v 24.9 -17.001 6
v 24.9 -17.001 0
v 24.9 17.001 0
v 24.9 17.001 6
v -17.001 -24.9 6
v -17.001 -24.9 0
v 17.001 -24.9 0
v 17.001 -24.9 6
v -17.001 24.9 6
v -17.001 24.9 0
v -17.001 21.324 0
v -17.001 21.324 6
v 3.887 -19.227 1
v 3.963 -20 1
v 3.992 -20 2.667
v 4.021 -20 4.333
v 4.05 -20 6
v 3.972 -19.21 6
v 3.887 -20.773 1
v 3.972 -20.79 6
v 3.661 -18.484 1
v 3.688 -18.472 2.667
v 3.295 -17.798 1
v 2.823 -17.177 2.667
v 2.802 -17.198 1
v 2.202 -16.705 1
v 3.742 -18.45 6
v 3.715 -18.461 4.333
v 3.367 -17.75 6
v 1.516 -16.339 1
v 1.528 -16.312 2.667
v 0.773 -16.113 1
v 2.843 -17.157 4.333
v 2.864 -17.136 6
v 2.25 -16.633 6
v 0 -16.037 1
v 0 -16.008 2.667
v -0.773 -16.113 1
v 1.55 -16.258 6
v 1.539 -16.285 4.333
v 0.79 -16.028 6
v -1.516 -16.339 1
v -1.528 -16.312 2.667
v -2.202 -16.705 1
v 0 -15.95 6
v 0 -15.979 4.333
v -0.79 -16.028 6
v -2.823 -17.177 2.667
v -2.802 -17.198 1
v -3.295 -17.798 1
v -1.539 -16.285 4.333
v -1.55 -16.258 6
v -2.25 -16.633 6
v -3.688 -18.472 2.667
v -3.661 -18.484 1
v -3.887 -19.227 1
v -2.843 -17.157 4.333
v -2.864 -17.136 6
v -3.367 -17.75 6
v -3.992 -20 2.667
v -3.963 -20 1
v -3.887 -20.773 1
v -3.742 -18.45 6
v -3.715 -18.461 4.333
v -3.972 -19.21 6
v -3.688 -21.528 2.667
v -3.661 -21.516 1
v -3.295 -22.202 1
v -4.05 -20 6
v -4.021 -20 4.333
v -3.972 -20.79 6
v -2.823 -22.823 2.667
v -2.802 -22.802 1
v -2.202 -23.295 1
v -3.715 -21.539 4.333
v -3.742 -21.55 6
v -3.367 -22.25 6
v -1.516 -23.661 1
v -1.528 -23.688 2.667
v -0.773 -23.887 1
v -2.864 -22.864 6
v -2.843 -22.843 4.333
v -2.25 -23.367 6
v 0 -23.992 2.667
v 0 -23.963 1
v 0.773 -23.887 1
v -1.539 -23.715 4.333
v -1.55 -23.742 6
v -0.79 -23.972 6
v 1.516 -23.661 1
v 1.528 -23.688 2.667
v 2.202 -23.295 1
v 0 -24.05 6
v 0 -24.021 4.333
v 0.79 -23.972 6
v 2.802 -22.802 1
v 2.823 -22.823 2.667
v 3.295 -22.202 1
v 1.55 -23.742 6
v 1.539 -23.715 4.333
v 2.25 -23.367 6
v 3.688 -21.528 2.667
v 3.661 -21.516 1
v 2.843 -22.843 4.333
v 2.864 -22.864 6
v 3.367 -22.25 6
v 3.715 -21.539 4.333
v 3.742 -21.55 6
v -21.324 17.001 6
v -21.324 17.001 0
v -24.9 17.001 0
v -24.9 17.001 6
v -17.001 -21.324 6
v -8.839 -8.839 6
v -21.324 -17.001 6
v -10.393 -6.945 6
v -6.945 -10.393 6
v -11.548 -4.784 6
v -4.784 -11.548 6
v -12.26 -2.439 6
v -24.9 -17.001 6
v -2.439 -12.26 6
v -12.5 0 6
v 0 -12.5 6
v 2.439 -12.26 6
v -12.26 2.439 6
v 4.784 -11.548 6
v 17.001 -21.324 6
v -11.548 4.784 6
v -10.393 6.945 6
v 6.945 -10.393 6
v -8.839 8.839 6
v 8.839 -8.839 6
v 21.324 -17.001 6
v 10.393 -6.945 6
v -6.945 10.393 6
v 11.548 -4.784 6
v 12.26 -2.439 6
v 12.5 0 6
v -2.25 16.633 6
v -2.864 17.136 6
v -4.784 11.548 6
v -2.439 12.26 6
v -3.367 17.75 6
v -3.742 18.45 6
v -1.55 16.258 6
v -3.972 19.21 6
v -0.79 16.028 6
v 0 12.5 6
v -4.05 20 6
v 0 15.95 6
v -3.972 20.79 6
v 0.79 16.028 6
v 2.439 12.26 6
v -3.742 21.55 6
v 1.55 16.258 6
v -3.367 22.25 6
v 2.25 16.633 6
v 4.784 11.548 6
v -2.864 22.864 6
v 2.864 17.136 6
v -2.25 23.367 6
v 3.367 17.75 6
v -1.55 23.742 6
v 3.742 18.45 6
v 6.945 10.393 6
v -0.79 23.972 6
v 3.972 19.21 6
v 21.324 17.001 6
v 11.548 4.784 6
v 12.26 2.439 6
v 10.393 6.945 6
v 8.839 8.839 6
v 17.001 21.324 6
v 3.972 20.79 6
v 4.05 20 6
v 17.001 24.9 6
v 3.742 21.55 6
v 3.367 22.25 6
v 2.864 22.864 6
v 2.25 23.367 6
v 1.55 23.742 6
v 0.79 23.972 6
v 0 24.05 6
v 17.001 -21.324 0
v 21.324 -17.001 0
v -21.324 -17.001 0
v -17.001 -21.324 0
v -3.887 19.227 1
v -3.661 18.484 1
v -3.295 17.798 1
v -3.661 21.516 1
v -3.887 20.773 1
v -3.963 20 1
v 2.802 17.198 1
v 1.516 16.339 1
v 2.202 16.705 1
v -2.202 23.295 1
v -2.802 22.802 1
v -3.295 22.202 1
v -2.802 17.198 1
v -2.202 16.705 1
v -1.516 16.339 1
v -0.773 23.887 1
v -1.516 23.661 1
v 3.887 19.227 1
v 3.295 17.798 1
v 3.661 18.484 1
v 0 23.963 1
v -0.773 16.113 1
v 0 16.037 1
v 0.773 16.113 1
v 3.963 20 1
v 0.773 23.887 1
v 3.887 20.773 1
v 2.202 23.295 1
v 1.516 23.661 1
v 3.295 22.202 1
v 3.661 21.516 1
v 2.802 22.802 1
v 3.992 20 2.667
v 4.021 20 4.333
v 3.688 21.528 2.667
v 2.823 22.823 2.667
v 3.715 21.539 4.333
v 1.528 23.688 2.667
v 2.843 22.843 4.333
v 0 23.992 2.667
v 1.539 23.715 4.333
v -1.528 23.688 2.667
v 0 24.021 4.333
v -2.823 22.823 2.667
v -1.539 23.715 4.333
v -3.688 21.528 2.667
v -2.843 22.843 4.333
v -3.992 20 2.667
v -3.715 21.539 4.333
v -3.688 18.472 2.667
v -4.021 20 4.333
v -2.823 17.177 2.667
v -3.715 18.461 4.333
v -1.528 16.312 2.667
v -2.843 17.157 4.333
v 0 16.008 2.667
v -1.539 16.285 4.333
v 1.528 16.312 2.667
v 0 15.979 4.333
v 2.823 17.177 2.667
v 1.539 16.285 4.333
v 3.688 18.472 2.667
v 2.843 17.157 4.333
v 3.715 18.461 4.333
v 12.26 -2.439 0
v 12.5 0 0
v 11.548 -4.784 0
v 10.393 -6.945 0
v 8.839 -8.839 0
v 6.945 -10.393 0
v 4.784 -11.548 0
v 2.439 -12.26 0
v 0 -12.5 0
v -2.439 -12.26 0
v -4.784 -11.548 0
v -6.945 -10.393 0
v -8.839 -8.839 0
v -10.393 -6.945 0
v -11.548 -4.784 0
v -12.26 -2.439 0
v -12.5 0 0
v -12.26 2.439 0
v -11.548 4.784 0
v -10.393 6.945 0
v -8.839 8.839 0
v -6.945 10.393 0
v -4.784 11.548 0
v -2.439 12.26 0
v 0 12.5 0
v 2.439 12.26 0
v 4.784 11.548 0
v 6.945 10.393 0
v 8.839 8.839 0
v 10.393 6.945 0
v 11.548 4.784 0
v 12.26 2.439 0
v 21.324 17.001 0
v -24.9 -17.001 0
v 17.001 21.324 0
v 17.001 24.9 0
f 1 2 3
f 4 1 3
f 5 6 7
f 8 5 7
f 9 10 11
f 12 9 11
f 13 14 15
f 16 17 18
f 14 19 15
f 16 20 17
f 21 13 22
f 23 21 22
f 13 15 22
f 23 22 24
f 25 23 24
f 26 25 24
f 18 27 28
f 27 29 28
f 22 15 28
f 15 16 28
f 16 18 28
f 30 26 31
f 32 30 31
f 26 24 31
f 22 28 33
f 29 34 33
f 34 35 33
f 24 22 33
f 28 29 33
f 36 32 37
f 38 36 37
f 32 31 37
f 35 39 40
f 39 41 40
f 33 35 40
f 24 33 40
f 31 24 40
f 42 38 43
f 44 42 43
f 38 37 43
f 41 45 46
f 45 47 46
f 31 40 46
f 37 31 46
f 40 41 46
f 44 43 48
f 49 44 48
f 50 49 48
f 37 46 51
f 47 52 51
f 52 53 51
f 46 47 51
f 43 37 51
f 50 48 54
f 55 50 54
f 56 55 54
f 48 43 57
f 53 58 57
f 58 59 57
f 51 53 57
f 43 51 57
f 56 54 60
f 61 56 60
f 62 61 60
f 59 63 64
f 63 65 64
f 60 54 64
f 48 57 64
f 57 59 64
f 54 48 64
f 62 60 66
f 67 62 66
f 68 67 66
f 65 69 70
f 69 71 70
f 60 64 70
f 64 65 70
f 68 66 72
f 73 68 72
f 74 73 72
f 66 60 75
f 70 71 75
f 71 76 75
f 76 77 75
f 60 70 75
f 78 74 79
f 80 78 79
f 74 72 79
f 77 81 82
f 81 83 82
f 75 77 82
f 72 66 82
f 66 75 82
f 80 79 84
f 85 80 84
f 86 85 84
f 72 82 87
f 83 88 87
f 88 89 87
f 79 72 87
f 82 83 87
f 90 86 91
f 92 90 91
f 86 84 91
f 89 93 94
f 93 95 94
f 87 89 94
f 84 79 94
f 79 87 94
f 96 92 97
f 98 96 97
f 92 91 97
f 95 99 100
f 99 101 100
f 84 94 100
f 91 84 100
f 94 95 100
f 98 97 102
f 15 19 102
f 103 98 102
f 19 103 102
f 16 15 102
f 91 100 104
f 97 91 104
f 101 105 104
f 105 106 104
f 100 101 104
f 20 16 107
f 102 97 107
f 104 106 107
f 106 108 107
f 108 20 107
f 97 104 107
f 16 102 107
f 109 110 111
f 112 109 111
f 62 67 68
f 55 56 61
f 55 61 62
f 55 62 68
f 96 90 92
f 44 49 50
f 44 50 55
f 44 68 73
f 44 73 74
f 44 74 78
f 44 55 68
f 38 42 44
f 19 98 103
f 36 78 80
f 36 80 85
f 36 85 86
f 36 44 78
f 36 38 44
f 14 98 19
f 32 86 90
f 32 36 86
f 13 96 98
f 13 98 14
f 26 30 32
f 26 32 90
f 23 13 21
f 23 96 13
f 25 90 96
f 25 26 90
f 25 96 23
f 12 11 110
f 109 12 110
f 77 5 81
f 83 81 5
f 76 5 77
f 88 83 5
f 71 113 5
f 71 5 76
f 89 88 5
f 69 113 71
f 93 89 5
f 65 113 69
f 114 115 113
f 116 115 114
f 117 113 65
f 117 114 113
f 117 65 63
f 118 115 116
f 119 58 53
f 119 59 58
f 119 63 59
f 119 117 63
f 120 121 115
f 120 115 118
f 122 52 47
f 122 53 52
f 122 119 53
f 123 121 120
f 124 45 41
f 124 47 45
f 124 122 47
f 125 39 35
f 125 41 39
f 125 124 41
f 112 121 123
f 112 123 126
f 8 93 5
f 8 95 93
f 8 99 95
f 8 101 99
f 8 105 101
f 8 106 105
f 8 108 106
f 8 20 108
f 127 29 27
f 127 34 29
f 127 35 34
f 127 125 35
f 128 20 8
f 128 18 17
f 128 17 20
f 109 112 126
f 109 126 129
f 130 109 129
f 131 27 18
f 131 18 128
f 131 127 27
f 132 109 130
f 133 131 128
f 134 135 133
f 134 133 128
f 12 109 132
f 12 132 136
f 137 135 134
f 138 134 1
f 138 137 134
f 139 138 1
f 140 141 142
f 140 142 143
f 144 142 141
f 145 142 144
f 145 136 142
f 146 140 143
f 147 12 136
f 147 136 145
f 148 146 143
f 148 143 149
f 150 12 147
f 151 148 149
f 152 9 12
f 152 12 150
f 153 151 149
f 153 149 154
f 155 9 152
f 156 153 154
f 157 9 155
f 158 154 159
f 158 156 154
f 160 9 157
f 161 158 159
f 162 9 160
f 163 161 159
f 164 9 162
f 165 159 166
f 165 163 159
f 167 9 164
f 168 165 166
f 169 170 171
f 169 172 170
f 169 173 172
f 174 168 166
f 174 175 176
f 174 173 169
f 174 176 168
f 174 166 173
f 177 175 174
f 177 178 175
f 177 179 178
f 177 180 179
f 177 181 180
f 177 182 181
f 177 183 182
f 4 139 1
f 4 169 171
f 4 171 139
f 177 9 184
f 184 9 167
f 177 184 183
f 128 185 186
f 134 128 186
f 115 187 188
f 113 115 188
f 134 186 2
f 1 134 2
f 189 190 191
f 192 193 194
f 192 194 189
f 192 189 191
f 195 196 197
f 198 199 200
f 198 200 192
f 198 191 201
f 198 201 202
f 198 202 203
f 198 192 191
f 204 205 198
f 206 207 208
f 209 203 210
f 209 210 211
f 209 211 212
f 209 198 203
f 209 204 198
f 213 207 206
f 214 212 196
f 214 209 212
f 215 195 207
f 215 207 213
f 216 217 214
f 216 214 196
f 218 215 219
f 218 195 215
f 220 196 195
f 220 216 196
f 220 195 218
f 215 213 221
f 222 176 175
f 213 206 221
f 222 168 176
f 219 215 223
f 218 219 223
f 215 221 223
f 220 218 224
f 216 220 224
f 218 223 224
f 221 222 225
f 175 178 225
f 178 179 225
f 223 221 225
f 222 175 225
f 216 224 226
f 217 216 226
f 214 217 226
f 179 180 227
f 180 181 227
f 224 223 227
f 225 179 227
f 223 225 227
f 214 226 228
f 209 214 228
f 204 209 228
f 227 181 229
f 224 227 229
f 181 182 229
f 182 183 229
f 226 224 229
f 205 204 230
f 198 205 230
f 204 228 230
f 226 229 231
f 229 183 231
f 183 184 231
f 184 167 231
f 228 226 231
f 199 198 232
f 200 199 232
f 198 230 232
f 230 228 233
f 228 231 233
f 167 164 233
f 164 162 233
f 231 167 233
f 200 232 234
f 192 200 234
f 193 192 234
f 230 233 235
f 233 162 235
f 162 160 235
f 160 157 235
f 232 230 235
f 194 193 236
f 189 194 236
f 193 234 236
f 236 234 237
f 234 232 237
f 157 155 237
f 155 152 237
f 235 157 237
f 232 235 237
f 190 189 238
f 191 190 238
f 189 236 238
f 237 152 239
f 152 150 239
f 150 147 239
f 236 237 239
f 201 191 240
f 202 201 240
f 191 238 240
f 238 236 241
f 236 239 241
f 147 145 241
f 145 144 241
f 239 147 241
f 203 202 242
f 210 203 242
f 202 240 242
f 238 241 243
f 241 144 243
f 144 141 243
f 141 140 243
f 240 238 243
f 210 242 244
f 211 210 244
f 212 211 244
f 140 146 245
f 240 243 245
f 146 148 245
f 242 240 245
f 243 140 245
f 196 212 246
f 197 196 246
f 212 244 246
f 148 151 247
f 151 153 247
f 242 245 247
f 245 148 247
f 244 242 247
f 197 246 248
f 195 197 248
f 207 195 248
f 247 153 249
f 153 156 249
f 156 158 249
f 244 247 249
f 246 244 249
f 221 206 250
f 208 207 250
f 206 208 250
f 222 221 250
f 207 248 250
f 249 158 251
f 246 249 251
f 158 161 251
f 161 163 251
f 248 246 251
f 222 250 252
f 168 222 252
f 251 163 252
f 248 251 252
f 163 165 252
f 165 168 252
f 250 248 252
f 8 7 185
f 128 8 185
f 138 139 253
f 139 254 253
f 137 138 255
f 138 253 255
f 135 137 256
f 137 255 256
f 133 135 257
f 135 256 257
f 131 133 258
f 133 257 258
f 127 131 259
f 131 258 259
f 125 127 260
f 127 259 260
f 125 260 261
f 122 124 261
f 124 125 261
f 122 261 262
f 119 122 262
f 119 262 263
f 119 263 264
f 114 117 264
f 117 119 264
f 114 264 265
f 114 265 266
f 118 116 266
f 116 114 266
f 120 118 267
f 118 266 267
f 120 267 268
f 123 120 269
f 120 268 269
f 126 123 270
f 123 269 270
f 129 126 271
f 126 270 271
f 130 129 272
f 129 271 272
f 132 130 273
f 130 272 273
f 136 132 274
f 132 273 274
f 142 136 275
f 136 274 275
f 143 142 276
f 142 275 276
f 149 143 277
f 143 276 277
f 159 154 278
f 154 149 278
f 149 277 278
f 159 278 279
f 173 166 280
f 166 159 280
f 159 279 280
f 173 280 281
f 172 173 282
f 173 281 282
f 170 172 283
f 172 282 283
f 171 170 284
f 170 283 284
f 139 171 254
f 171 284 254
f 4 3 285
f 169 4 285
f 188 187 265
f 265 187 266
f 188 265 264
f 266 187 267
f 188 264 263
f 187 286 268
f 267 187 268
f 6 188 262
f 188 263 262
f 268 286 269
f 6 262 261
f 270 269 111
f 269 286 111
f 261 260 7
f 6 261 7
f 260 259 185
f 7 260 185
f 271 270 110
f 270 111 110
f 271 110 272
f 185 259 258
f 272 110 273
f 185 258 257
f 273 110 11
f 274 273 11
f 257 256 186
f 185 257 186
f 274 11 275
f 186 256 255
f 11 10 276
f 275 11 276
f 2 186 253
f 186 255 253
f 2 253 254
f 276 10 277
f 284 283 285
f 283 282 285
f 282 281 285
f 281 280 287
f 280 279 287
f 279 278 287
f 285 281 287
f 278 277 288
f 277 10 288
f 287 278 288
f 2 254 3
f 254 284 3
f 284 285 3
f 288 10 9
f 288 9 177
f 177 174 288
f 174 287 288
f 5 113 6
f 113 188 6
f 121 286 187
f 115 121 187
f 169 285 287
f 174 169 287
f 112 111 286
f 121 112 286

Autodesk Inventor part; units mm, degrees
ref_plane "YZ Plane" through (0, 0, 0) normal (1, 0, 0) x (0, 1, 0)
ref_plane "XZ Plane" through (0, 0, 0) normal (0, 1, 0) x (-1, 0, 0)
ref_plane "XY Plane" through (0, 0, 0) normal (0, 0, 1) x (1, 0, 0)
sketch "Sketch1" plane through (0, 0, 0) normal (0, 0, 1) x (1, 0, 0)
  line L0 (-34.86, 0) -> (34.86, 0) construction
  line L1 (0, -34.86) -> (0, 34.86) construction
  line L2 (0, 0) -> (11.157509, 11.157509) construction
  line L3 (0, 0) -> (15.7791, 0) construction
  line L4 (0, 24.9) -> (16.800857, 24.9)
  line L5 (16.800857, 24.9) -> (16.800857, 21.241488)
  line L6 (16.800857, 21.241488) -> (19.021172, 19.021172)
  line L7 (24.9, 0) -> (24.9, 16.800857)
  line L8 (24.9, 16.800857) -> (21.241488, 16.800857)
  line L9 (21.241488, 16.800857) -> (19.021172, 19.021172)
  line L10 (0, -24.9) -> (16.800857, -24.9)
  line L11 (16.800857, -24.9) -> (16.800857, -21.241488)
  line L12 (16.800857, -21.241488) -> (19.021172, -19.021172)
  line L13 (24.9, 0) -> (24.9, -16.800857)
  line L14 (24.9, -16.800857) -> (21.241488, -16.800857)
  line L15 (21.241488, -16.800857) -> (19.021172, -19.021172)
  line L16 (0, 24.9) -> (-16.800857, 24.9)
  line L17 (-16.800857, 24.9) -> (-16.800857, 21.241488)
  line L18 (-16.800857, 21.241488) -> (-19.021172, 19.021172)
  line L19 (-24.9, 16.800857) -> (-21.241488, 16.800857)
  line L20 (-21.241488, 16.800857) -> (-19.021172, 19.021172)
  line L21 (0, -24.9) -> (-16.800857, -24.9)
  line L22 (-16.800857, -24.9) -> (-16.800857, -21.241488)
  line L23 (-16.800857, -21.241488) -> (-19.021172, -19.021172)
  line L24 (-21.241488, -16.800857) -> (-19.021172, -19.021172)
  line L25 (-24.9, -16.800857) -> (-21.241488, -16.800857)
  line L26 (-24.9, 0) -> (-24.9, -16.800857)
  line L27 (-24.9, 0) -> (-24.9, 16.800857)
  circle A0 centre (0, 0) radius 12.5
  dimension "d0" = 45
  dimension "d2" = 24.9
  dimension "d3" = 3.14
  dimension "d4" = 26.9
  dimension "d5" = 25
extrude "Extrusion1" add sketch "Sketch1" along normal blind 6
sketch "Sketch4" plane through (0, 0, 0) normal (0, 0, -1) x (-1, 0, 0)
  circle A0 centre (0, 0) radius 12.5 construction
  line L0 (16.800857, 24.9) -> (-16.800857, 24.9) construction
  line L1 (-16.800857, 24.9) -> (-16.800857, 21.241488)
  line L2 (-16.800857, 21.241488) -> (-21.241488, 16.800857)
  line L3 (-21.241488, 16.800857) -> (-24.9, 16.800857)
  line L4 (-24.9, 16.800857) -> (-24.9, -16.800857) construction
  line L5 (-24.9, -16.800857) -> (-21.241488, -16.800857)
  line L6 (-21.241488, -16.800857) -> (-16.800857, -21.241488)
  line L7 (-16.800857, -21.241488) -> (-16.800857, -24.9)
  line L8 (-16.800857, -24.9) -> (16.800857, -24.9) construction
  line L9 (16.800857, -24.9) -> (16.800857, -21.241488)
  line L10 (16.800857, -21.241488) -> (21.241488, -16.800857)
  line L11 (21.241488, -16.800857) -> (24.9, -16.800857)
  line L12 (24.9, -16.800857) -> (24.9, 16.800857) construction
  line L13 (24.9, 16.800857) -> (21.241488, 16.800857)
  line L14 (21.241488, 16.800857) -> (16.800857, 21.241488)
  line L15 (16.800857, 21.241488) -> (16.800857, 24.9)
  line L16 (-17.000857, 25.1) -> (17.000857, 25.1) construction
  line L17 (17.000857, 25.1) -> (17.000857, 21.32433)
  line L18 (17.000857, 21.32433) -> (21.32433, 17.000857)
  line L19 (21.32433, 17.000857) -> (25.1, 17.000857)
  line L20 (25.1, 17.000857) -> (25.1, -17.000857) construction
  line L21 (25.1, -17.000857) -> (21.32433, -17.000857)
  line L22 (21.32433, -17.000857) -> (17.000857, -21.32433)
  line L23 (17.000857, -21.32433) -> (17.000857, -25.1)
  line L24 (17.000857, -25.1) -> (-17.000857, -25.1) construction
  line L25 (-17.000857, -25.1) -> (-17.000857, -21.32433)
  line L26 (-17.000857, -21.32433) -> (-21.32433, -17.000857)
  line L27 (-21.32433, -17.000857) -> (-25.1, -17.000857)
  line L28 (-25.1, -17.000857) -> (-25.1, 17.000857) construction
  line L29 (-25.1, 17.000857) -> (-21.32433, 17.000857)
  line L30 (-21.32433, 17.000857) -> (-17.000857, 21.32433)
  line L31 (-17.000857, 21.32433) -> (-17.000857, 25.1)
  line L32 (-24.9, -16.800857) -> (-24.9, 16.800857)
  line L33 (-24.9, 16.800857) -> (-24.9, 17.000857)
  line L34 (-16.800857, 24.9) -> (-17.000857, 24.9)
  line L35 (-16.800857, 24.9) -> (16.800857, 24.9)
  line L36 (16.800857, 24.9) -> (17.000857, 24.9)
  line L37 (24.9, 16.800857) -> (24.9, 17.000857)
  line L38 (24.9, 16.800857) -> (24.9, -16.800857)
  line L39 (24.9, -16.800857) -> (24.9, -17.000857)
  line L40 (16.800857, -24.9) -> (-16.800857, -24.9)
  line L41 (16.800857, -24.9) -> (17.000857, -24.9)
  line L42 (-16.800857, -24.9) -> (-17.000857, -24.9)
  line L43 (-24.9, -16.800857) -> (-24.9, -17.000857)
  dimension "d19" = 0.2
extrude "IM_offset" add sketch "Sketch4" against normal up to surface (6 mm away) contours L1 L2 L3 L33 L29 L30 L31 L34 | L36 L17 L18 L19 L37 L13 L14 L15 | L5 L6 L7 L42 L25 L26 L27 L43 | L39 L21 L22 L23 L41 L9 L10 L11
sketch "Skizze5" plane through (0, 0, 6) normal (0, 0, 1) x (1, 0, 0)
  circle A0 centre (0, 0) radius 12.5
  line L0 (-17.000857, 24.9) -> (17.000857, 24.9)
  line L1 (-17.000857, 21.32433) -> (-17.000857, 24.9)
  line L2 (-21.32433, 17.000857) -> (-17.000857, 21.32433)
  line L3 (-24.9, 17.000857) -> (-21.32433, 17.000857)
  line L4 (-24.9, -17.000857) -> (-24.9, 17.000857)
  line L5 (-21.32433, -17.000857) -> (-24.9, -17.000857)
  line L6 (-17.000857, -21.32433) -> (-21.32433, -17.000857)
  line L7 (-17.000857, -24.9) -> (-17.000857, -21.32433)
  line L8 (17.000857, -24.9) -> (-17.000857, -24.9)
  line L9 (17.000857, -21.32433) -> (17.000857, -24.9)
  line L10 (21.32433, -17.000857) -> (17.000857, -21.32433)
  line L11 (24.9, -17.000857) -> (21.32433, -17.000857)
  line L12 (24.9, 17.000857) -> (24.9, -17.000857)
  line L13 (21.32433, 17.000857) -> (24.9, 17.000857)
  line L14 (17.000857, 21.32433) -> (21.32433, 17.000857)
  line L15 (17.000857, 24.9) -> (17.000857, 21.32433)
  circle A1 centre (0, 0) radius 20
  circle A2 centre (0, 20) radius 4.05
  circle A3 centre (0, -20) radius 4.05
  dimension "d22" = 40
  dimension "d23" = 8.1
  dimension "d24" = 8.1
sketch "Skizze5 outline for Extrusion4" plane through (0, 0, 6) normal (0, 0, 1) x (1, 0, 0)
  circle A0 centre (0, -20) radius 4.05
  circle A1 centre (0, 20) radius 4.05
extrude "Extrusion4" cut sketch "Skizze5 outline for Extrusion4" against normal blind 5 draft -1
properties part number "20_Cube_insert_Sample_holder_v3"
